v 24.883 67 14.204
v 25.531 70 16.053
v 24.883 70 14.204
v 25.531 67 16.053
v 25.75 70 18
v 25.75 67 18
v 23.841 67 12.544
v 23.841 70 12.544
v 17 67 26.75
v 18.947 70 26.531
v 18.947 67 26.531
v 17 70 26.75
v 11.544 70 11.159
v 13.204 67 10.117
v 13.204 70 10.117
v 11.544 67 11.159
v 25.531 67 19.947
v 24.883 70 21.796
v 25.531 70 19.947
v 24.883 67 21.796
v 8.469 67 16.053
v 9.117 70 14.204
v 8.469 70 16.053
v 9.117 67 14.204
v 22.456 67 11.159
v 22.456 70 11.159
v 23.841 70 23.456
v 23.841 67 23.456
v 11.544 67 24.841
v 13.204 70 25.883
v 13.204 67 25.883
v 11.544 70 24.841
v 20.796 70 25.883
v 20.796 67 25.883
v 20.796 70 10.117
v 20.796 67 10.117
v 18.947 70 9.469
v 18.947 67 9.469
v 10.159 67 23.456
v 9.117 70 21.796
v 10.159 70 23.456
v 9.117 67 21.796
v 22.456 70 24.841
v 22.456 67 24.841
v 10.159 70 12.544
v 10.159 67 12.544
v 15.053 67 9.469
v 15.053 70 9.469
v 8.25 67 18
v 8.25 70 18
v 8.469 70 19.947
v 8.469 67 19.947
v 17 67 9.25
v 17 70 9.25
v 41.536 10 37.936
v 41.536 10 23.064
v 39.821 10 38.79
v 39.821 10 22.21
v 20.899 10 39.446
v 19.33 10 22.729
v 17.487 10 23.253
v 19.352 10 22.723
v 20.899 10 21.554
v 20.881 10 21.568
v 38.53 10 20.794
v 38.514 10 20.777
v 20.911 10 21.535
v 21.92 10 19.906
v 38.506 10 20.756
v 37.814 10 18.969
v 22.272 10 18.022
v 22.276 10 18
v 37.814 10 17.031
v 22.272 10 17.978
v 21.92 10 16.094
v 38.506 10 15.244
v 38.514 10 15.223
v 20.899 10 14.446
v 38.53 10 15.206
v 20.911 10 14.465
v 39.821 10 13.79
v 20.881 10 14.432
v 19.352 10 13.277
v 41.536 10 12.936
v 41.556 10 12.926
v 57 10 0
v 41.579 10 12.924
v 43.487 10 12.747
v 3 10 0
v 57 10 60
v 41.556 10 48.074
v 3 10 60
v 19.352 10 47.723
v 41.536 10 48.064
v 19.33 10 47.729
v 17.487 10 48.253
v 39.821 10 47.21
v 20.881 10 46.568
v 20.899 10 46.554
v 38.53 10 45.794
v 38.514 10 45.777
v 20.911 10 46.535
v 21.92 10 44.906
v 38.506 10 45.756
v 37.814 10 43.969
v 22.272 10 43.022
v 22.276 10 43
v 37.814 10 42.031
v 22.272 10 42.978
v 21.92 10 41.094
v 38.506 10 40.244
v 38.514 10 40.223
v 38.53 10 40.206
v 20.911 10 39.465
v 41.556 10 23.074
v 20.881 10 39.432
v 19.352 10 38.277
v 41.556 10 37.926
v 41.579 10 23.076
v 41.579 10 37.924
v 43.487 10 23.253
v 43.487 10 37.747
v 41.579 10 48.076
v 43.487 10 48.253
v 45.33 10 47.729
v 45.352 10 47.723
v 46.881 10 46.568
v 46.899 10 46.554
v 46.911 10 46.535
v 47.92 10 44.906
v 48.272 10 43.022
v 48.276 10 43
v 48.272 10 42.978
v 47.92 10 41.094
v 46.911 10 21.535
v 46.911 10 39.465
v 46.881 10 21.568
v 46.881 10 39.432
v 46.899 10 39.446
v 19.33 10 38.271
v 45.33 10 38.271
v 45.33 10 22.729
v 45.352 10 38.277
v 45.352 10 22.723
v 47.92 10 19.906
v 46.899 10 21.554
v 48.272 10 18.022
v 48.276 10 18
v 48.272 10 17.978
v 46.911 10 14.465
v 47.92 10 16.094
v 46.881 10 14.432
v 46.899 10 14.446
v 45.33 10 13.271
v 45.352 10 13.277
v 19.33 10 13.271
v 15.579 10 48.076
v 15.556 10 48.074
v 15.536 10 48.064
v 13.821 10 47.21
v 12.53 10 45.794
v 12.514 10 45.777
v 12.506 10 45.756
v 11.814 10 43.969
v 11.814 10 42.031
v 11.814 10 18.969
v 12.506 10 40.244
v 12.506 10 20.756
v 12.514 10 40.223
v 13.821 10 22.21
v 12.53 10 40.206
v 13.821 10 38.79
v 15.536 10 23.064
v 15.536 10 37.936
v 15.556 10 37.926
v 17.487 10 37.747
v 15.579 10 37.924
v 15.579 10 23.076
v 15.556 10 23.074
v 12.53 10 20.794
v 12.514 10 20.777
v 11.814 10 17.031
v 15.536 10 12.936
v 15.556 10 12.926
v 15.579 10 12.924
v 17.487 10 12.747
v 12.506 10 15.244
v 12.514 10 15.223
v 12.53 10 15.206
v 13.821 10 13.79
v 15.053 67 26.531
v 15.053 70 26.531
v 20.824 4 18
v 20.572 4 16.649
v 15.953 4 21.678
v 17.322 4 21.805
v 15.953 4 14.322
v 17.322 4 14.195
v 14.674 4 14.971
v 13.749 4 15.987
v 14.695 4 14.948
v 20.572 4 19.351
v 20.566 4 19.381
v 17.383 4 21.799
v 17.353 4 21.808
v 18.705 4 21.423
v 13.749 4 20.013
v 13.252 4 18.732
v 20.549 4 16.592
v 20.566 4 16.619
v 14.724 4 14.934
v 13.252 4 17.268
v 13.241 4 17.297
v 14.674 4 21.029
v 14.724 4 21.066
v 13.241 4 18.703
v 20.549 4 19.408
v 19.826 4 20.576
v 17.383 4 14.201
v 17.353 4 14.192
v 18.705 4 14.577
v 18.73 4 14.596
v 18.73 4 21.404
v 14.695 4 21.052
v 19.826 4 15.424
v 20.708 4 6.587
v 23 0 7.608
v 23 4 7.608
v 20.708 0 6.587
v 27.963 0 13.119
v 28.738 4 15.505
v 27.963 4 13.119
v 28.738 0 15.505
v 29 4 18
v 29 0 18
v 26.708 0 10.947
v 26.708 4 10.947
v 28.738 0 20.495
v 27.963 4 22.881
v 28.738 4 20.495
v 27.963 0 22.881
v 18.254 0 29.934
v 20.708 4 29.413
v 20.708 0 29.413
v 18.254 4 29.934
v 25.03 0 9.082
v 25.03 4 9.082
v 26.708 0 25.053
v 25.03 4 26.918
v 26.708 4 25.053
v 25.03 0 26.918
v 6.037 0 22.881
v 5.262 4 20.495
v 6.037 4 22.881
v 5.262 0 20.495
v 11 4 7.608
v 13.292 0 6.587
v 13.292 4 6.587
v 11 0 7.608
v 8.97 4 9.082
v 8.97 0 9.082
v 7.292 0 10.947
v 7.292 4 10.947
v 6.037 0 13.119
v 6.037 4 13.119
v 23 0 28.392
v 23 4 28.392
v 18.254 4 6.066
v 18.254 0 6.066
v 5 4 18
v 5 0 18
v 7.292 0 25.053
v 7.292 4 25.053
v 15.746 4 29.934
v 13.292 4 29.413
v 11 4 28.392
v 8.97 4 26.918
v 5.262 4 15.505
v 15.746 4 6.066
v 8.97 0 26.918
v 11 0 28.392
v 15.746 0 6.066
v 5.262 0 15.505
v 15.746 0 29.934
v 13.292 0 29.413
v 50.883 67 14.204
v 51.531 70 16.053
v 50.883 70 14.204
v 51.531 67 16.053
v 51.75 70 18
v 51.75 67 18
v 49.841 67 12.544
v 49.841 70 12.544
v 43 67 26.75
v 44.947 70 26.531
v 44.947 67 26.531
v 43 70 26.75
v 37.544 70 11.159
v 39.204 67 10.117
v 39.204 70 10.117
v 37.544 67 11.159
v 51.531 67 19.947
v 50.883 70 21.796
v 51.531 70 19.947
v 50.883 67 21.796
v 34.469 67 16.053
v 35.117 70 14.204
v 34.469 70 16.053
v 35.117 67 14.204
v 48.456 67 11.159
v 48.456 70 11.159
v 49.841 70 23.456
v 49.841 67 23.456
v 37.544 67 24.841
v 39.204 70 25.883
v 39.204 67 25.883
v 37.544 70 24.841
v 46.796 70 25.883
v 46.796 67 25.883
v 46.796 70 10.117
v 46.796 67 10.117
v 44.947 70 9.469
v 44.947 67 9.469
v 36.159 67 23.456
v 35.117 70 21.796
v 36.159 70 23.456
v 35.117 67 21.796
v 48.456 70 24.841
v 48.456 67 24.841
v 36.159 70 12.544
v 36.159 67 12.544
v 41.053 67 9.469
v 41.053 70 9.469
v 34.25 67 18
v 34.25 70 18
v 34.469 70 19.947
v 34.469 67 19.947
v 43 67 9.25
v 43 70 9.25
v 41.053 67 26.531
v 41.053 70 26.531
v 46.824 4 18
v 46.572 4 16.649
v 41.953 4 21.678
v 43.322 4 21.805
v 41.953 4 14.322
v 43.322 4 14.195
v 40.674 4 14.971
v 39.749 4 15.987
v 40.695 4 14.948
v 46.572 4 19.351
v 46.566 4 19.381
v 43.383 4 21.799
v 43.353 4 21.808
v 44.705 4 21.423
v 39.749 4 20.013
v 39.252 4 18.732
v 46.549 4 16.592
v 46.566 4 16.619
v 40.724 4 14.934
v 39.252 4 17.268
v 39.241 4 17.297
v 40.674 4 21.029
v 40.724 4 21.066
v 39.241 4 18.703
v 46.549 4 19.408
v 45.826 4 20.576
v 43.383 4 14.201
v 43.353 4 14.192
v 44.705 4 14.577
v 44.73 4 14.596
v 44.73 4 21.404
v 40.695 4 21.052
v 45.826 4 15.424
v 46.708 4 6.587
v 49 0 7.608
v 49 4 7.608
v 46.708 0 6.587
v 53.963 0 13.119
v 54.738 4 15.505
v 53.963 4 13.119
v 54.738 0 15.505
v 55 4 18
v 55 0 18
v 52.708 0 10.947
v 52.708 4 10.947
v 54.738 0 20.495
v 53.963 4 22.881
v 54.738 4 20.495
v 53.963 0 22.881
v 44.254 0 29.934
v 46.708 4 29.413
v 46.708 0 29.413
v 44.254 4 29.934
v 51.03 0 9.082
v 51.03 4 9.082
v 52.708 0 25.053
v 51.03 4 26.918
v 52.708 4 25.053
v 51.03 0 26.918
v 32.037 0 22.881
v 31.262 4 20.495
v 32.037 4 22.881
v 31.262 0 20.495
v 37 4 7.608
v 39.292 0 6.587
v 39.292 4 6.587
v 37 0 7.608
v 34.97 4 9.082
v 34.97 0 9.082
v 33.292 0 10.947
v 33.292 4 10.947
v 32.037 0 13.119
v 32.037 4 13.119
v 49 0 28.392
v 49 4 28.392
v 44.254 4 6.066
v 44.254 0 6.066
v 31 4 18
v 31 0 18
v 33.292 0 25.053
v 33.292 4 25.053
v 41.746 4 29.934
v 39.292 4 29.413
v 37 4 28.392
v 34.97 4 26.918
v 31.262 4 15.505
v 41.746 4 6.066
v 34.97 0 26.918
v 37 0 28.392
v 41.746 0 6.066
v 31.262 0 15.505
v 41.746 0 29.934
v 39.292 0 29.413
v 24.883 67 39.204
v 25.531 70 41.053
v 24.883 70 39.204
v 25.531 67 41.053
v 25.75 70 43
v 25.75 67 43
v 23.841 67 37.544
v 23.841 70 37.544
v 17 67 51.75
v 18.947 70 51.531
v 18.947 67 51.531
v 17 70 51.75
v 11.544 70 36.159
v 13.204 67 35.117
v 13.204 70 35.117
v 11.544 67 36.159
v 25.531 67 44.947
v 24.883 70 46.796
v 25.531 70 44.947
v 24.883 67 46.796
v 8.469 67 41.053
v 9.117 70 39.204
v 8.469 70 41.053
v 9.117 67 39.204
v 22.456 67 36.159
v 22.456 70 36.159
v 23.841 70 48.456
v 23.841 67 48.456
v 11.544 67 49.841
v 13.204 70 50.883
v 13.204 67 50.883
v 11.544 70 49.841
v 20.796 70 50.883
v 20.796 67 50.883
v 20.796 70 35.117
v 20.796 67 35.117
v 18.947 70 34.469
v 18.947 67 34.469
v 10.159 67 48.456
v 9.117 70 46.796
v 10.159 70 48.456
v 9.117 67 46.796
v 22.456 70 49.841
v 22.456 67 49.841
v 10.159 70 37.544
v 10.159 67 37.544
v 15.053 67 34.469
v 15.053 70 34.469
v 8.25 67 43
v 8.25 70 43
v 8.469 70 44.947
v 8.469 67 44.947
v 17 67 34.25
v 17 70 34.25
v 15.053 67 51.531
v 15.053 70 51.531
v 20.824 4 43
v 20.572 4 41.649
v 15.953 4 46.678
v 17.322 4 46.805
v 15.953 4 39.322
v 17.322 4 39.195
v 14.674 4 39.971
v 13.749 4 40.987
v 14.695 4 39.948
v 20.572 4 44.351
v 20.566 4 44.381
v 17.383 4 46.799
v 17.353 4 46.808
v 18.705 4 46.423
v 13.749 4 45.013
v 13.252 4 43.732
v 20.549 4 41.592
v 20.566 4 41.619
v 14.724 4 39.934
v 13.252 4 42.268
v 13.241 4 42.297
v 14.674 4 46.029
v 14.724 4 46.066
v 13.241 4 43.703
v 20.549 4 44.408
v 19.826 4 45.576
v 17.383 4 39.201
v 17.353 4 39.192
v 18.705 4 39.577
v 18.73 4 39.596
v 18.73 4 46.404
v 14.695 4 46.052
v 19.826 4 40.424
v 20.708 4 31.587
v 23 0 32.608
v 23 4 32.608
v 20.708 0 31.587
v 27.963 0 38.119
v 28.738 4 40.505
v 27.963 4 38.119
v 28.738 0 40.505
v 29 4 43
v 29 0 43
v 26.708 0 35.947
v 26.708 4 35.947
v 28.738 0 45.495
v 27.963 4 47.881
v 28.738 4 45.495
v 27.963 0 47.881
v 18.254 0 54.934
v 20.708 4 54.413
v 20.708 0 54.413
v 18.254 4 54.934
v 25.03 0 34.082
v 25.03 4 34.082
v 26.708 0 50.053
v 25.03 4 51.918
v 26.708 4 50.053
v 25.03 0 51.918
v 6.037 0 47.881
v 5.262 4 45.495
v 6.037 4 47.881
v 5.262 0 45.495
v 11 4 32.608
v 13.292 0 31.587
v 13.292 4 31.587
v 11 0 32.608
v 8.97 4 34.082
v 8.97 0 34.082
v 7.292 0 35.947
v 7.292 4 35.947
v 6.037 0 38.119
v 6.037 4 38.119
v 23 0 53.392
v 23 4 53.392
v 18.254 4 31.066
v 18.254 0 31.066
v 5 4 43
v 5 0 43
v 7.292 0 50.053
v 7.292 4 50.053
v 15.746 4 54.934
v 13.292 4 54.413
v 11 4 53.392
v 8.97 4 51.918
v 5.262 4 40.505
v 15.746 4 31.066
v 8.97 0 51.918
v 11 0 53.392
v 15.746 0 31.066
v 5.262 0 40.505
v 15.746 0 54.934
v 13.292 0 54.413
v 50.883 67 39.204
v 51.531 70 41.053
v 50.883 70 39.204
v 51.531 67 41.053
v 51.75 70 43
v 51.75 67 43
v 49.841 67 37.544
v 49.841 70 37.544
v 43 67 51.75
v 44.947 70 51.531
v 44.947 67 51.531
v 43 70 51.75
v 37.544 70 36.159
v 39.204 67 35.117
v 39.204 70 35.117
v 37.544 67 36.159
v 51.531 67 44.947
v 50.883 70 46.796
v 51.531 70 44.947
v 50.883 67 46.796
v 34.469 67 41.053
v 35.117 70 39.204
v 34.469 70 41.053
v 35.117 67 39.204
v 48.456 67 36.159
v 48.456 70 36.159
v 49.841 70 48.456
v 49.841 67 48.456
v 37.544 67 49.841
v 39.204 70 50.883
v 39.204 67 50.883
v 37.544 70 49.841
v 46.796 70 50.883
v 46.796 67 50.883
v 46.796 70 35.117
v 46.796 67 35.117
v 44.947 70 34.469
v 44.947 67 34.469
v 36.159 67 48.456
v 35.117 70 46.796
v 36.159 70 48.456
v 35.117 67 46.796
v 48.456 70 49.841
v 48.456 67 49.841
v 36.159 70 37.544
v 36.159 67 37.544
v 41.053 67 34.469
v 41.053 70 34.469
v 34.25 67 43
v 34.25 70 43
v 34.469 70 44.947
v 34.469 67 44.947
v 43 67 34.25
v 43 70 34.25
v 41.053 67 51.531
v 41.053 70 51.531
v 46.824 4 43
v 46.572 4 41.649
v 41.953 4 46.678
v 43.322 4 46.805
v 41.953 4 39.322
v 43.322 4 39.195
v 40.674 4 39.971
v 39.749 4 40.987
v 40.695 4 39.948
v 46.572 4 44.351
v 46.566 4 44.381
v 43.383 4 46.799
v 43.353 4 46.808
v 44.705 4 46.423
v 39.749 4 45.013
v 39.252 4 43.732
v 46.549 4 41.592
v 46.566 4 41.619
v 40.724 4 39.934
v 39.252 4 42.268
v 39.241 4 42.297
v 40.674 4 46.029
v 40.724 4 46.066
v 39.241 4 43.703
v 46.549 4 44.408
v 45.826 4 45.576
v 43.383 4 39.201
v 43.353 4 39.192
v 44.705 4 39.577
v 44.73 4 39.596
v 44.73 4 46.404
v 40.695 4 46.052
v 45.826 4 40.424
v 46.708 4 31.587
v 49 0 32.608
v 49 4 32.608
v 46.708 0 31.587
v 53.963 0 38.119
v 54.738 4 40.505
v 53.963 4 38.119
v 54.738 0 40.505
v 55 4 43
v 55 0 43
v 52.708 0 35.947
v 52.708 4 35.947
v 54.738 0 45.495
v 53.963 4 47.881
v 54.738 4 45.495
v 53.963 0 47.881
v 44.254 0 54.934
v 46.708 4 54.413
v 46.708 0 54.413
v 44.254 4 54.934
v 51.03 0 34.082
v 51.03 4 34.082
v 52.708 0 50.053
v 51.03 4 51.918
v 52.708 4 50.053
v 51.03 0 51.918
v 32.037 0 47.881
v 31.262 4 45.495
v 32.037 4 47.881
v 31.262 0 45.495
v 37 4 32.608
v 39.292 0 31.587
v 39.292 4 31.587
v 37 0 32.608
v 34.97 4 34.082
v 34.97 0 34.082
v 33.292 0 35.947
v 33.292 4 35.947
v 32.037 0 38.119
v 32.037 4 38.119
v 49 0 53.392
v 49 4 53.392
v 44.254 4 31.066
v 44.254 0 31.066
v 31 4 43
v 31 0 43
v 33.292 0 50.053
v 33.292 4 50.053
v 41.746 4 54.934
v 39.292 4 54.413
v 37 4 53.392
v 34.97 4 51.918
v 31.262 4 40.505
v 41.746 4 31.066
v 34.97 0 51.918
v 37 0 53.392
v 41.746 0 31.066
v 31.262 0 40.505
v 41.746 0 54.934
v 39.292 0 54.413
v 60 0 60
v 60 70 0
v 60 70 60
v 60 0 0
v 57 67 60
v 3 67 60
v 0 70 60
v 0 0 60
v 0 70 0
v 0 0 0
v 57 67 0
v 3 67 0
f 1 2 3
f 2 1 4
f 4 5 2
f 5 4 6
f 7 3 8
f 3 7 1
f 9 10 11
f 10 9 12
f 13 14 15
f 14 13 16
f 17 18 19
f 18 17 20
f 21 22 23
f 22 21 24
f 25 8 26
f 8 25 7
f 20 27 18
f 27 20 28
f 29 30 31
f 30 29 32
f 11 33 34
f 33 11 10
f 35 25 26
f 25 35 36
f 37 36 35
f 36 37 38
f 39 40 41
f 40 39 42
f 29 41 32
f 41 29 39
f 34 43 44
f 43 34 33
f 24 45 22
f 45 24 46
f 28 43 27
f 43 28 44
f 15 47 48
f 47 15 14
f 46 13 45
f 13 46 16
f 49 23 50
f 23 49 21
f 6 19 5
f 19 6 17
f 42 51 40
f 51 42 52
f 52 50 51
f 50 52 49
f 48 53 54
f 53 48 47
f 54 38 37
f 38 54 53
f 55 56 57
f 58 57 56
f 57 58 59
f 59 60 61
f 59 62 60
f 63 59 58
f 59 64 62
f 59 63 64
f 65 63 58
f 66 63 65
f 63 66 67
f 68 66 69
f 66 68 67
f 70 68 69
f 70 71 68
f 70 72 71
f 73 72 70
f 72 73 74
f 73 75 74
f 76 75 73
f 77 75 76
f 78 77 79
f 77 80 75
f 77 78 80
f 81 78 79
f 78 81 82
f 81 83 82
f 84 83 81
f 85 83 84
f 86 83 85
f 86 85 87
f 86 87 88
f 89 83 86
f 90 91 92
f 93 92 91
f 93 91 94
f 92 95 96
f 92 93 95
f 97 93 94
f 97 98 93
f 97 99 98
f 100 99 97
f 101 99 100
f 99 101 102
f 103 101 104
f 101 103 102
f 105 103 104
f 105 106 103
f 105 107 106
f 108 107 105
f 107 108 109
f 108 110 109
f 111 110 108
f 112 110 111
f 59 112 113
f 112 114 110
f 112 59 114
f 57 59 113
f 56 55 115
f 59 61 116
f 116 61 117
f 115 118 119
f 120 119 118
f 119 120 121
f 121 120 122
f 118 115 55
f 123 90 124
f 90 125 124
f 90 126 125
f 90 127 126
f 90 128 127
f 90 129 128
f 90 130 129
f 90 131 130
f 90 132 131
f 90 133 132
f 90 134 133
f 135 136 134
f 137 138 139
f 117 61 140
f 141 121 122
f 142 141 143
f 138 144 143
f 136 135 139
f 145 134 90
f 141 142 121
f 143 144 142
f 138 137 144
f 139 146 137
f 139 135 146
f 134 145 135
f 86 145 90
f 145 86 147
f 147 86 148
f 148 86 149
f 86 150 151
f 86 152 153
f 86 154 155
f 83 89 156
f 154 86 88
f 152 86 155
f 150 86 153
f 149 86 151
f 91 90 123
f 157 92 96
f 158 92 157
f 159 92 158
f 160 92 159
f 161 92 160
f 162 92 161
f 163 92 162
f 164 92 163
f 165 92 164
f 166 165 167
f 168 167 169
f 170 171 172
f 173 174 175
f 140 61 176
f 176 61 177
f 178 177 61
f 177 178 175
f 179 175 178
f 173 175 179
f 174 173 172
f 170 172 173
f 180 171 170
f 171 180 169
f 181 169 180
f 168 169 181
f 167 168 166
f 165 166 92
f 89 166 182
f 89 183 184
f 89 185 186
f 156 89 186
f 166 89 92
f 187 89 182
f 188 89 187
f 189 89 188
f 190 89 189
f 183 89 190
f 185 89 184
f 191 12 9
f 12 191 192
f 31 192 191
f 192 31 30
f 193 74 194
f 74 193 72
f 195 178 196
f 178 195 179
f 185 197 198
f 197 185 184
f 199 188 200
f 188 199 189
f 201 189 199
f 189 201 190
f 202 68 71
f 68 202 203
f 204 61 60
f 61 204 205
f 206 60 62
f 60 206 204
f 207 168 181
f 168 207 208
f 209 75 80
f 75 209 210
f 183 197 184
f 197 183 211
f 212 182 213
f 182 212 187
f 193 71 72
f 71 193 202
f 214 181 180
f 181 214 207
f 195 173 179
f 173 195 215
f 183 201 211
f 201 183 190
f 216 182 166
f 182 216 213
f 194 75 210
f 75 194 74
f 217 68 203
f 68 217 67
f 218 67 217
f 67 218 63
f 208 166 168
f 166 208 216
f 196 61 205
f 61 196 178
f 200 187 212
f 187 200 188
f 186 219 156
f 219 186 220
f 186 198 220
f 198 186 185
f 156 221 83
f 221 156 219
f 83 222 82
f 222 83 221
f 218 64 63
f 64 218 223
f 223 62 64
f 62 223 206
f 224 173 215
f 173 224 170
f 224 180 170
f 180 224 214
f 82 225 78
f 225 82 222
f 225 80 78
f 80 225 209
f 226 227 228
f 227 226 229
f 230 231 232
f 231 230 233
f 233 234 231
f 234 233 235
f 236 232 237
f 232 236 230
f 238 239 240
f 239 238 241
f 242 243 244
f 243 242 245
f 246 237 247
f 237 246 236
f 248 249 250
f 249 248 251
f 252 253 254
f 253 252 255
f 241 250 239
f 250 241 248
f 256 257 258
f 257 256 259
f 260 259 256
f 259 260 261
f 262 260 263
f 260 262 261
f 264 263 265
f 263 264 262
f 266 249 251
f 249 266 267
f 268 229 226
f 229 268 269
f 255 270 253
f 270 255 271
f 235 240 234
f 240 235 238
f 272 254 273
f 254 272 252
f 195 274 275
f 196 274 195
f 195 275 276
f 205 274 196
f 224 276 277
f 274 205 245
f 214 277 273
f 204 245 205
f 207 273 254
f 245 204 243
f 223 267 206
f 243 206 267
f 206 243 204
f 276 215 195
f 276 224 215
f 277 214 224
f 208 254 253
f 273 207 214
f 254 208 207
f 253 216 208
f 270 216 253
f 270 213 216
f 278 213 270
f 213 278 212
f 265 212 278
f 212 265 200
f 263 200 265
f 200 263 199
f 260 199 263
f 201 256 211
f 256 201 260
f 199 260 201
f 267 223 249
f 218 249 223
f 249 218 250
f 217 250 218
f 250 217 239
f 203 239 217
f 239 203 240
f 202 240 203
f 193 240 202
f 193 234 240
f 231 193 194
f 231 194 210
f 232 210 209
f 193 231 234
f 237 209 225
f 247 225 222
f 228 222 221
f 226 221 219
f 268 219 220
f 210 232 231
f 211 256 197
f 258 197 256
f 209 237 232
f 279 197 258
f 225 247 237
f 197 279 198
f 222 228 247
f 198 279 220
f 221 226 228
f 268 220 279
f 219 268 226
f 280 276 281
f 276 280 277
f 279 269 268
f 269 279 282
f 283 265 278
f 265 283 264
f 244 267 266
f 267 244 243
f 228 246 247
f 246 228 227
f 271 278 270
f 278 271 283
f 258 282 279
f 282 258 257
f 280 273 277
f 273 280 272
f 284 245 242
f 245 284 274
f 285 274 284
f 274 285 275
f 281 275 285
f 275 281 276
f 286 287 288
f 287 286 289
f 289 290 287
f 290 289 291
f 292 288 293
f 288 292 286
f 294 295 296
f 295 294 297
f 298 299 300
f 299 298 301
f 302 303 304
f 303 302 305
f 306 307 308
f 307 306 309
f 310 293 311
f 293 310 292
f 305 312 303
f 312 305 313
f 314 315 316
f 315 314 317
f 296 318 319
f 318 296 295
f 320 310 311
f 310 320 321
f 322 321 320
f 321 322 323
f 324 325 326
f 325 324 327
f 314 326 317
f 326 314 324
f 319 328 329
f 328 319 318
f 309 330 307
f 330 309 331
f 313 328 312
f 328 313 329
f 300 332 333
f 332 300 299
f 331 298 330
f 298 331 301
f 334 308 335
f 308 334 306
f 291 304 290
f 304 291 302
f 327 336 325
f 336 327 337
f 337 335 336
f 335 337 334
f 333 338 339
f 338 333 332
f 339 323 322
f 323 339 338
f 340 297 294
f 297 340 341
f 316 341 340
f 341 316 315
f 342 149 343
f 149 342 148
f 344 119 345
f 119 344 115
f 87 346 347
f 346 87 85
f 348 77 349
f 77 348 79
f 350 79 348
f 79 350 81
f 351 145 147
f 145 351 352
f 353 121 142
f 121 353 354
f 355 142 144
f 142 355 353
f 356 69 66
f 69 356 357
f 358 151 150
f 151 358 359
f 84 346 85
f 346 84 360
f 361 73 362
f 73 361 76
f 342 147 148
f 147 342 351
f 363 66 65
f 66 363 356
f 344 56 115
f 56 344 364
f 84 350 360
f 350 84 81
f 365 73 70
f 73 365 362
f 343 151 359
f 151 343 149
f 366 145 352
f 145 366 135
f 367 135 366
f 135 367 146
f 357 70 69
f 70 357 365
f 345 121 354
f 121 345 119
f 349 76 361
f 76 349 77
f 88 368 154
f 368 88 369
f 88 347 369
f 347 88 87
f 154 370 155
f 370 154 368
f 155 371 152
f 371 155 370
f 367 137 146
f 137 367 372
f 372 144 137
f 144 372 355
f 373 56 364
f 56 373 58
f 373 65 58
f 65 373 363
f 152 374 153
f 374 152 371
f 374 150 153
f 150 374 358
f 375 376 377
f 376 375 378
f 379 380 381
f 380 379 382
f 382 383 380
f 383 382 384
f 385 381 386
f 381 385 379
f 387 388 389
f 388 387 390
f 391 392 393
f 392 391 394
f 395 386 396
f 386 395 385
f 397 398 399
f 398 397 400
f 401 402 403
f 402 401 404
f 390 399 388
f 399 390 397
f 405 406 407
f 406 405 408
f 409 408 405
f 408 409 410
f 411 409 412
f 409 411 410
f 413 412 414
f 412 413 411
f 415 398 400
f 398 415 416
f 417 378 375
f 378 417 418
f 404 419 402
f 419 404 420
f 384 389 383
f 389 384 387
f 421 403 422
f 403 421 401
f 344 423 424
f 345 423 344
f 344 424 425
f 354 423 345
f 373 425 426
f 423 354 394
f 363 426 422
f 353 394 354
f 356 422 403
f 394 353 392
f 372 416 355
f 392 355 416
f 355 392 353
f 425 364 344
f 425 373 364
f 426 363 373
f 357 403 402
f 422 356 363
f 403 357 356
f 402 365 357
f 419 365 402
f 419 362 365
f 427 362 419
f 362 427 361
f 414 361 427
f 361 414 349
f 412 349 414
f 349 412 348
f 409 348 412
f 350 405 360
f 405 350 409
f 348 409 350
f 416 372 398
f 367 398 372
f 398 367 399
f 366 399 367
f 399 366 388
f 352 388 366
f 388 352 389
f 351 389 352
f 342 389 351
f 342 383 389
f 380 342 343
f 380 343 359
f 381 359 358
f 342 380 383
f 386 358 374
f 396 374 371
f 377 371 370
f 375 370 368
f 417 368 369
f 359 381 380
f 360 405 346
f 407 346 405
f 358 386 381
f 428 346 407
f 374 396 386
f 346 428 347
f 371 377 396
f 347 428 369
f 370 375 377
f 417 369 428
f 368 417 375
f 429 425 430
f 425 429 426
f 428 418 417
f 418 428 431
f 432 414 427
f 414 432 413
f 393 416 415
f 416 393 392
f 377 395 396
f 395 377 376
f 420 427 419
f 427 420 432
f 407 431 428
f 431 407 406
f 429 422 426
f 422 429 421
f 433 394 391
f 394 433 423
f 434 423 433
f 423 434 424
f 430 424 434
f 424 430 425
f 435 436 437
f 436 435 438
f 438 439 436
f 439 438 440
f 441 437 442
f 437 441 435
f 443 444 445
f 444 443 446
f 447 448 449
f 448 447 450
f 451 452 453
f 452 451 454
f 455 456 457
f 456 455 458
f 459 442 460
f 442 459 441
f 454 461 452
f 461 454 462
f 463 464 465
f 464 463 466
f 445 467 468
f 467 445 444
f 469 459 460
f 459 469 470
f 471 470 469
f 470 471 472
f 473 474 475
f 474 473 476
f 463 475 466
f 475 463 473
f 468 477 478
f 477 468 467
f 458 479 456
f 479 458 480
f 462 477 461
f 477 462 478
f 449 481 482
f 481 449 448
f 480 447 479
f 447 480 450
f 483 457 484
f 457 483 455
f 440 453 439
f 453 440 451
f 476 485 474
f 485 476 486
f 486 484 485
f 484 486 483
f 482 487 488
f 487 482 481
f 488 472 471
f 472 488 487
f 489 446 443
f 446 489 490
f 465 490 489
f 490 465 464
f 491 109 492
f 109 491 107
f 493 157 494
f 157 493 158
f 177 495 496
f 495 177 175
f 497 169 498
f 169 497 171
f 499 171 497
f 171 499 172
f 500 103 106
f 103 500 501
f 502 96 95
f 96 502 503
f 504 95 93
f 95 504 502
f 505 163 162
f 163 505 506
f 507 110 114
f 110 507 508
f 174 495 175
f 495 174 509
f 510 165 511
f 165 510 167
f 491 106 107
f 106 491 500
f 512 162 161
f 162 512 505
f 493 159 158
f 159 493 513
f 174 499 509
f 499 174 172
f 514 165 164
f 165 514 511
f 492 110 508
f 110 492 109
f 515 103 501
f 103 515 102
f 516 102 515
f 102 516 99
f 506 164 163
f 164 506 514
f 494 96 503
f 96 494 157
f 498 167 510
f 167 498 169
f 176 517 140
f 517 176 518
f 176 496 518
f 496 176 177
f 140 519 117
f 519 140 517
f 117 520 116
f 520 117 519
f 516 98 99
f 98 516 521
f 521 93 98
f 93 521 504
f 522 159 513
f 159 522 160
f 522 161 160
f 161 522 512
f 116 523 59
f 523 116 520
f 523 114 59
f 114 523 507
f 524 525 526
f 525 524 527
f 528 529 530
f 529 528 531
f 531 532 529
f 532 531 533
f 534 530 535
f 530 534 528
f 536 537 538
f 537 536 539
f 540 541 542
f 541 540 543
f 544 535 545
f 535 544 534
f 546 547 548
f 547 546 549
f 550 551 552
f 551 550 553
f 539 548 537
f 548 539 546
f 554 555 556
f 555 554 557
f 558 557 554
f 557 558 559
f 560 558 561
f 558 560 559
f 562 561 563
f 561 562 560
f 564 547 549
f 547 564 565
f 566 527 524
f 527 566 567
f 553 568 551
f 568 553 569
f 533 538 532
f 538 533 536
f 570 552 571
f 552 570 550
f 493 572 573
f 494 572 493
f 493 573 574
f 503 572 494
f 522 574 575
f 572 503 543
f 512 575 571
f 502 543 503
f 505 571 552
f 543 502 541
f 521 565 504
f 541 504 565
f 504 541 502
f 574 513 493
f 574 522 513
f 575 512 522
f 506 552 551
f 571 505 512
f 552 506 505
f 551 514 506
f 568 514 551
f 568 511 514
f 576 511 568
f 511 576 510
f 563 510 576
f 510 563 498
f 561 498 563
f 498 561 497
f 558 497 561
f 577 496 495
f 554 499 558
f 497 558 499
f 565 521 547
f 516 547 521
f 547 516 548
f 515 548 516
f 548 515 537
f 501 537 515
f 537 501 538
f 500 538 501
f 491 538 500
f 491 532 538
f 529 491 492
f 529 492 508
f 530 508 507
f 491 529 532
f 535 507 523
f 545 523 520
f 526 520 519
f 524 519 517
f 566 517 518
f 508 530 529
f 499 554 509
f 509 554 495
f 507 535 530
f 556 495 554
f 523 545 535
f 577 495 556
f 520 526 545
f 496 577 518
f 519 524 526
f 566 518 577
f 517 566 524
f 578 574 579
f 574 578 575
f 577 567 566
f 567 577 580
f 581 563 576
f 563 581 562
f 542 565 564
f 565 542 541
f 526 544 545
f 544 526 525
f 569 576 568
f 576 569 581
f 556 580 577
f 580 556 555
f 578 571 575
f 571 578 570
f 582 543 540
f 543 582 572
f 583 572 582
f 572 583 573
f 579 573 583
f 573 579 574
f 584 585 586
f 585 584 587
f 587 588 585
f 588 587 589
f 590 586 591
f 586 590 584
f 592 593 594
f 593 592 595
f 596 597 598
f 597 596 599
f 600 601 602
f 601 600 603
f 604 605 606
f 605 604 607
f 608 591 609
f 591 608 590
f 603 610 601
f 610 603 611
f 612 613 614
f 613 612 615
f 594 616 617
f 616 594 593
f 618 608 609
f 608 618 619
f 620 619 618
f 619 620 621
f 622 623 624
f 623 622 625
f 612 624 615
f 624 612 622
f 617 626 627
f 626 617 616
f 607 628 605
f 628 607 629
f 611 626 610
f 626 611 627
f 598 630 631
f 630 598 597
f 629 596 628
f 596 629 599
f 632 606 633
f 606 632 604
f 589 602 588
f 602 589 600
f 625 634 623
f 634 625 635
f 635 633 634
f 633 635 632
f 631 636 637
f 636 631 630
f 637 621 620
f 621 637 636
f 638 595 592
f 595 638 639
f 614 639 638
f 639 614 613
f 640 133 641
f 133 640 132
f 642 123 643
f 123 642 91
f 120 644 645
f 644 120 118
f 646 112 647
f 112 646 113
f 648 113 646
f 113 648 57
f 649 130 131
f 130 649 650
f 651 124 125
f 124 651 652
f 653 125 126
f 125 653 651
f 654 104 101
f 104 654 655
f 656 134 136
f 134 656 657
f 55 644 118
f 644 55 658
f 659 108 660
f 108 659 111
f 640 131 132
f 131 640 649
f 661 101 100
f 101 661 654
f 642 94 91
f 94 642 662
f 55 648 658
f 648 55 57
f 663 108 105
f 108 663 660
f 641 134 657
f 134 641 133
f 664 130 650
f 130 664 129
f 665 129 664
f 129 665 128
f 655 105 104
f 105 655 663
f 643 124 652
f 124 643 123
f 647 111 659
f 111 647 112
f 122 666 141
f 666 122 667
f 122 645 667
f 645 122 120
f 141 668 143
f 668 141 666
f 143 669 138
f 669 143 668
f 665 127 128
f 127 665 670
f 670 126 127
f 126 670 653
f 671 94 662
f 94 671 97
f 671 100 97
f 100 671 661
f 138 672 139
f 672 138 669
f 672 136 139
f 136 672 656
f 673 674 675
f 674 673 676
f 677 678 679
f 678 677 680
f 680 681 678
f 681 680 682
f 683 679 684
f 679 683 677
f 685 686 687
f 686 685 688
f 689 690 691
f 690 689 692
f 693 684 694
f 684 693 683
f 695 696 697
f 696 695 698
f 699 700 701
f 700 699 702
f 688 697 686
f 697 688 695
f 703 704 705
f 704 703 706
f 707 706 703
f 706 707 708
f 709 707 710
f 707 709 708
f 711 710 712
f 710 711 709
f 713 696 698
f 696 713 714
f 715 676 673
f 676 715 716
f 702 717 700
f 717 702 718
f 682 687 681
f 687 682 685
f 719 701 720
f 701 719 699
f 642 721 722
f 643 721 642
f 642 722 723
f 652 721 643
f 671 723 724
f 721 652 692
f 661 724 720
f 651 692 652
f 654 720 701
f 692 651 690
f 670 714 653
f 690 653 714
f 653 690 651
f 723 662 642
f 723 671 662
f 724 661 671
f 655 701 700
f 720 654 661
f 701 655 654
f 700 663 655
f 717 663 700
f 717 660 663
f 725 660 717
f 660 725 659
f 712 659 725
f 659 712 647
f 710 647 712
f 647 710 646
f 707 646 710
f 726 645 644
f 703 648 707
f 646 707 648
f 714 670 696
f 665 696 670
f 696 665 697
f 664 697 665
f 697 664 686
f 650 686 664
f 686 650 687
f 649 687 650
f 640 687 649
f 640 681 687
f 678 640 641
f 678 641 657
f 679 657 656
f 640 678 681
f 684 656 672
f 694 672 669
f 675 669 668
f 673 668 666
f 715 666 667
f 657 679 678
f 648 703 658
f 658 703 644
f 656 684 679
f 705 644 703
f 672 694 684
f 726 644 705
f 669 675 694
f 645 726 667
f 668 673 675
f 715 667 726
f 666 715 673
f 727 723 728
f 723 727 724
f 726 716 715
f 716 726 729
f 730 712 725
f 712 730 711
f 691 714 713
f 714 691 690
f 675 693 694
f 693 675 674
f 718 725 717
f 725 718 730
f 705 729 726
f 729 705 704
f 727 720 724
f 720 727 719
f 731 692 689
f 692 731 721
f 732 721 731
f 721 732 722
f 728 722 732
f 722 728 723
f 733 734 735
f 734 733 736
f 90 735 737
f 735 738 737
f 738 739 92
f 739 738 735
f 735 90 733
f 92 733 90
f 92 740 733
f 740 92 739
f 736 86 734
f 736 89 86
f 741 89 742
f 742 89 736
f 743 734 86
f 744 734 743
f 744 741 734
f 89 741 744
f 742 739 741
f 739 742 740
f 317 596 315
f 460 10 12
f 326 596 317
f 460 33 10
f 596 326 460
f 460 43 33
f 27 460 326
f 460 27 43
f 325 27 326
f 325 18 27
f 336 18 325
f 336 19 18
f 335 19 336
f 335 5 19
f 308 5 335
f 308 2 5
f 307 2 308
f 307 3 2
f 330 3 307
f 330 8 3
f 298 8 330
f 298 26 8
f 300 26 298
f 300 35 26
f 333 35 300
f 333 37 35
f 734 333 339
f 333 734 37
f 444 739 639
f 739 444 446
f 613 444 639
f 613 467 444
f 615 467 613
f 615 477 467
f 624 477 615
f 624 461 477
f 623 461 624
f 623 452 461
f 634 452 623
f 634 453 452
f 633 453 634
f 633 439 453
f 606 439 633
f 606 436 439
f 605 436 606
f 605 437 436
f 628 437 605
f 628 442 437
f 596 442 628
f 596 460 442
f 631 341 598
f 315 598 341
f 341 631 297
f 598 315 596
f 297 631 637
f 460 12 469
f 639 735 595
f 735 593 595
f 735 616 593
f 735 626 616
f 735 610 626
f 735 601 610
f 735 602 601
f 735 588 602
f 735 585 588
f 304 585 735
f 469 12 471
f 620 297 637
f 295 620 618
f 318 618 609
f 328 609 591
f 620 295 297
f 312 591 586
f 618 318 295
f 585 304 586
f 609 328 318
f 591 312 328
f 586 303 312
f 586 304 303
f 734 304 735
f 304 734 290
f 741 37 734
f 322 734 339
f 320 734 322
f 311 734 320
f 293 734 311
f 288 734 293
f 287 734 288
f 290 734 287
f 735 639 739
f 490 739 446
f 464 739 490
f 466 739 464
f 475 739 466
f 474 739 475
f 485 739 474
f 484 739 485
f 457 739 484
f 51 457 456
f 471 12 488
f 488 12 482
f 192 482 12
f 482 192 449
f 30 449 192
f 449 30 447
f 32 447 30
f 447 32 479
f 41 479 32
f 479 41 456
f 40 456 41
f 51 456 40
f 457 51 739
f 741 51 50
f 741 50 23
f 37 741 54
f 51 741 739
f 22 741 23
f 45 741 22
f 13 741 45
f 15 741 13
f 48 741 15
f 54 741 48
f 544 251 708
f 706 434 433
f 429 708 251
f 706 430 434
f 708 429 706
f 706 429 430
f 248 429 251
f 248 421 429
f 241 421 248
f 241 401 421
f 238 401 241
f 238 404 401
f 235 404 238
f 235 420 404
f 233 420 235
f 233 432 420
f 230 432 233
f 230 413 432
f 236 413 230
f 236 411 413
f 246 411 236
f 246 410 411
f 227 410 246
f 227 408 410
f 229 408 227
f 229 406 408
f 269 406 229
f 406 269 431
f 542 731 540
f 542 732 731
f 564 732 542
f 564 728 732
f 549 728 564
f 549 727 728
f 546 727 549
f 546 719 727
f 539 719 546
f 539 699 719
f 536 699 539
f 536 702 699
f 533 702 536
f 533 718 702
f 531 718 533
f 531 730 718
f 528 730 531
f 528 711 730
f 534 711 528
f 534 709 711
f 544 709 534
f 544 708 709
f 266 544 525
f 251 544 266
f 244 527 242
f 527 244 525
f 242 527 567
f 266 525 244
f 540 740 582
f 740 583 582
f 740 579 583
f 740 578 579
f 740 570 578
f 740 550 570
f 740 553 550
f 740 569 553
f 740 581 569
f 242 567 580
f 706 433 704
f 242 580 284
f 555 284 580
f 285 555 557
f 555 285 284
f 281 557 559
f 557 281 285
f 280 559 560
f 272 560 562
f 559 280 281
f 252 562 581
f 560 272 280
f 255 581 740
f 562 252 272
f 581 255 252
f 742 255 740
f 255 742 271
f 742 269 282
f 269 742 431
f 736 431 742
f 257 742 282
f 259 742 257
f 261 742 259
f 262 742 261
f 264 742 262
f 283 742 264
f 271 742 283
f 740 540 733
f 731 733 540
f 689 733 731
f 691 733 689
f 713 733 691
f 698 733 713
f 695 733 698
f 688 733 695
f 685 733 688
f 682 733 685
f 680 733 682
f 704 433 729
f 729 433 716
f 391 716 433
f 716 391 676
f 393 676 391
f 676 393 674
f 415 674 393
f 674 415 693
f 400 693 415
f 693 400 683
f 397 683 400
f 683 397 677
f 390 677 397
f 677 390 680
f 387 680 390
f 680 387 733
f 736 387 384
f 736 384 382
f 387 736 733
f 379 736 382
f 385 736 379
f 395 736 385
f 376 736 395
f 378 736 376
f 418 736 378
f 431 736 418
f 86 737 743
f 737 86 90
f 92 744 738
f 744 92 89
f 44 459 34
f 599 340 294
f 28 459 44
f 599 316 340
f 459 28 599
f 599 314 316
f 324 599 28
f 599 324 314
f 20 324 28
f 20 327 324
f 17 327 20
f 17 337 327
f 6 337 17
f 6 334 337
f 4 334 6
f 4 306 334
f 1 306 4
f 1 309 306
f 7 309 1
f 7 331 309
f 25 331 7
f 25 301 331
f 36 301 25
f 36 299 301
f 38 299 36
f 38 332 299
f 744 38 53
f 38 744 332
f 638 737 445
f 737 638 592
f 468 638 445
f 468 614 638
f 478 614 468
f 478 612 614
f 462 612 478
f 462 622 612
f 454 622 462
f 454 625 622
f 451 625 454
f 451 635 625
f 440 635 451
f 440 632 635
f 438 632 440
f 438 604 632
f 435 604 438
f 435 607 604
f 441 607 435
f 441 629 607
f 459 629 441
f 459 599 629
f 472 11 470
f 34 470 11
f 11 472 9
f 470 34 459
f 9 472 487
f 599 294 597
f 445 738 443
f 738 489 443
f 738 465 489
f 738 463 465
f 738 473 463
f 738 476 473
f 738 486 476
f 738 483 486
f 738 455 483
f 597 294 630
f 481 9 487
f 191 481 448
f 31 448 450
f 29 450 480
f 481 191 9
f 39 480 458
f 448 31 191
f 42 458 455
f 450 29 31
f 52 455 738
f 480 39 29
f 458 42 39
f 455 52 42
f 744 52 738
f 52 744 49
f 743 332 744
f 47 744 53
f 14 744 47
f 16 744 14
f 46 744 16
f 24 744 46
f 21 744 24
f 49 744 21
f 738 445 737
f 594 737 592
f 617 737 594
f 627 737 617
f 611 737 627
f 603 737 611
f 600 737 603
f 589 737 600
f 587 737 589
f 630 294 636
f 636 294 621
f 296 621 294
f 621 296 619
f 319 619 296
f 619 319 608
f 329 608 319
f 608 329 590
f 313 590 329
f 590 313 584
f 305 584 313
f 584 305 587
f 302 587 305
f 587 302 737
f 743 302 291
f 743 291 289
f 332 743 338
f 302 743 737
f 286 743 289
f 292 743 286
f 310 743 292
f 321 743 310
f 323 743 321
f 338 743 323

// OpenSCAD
// Vial dimensions from:
// https://www.viaglobalhealth.com/wp-content/uploads/corning-docs/t_centrifuge_tube_insert_DL.pdf

vial_radius = 17.5/2;
vial_cap_radius = 24/2;
bottom_hole_radius = 3.8;

stand_height = 70;
base_height = 10;

vial_cap_clearance = 2;

wall_size = 3;


module tube_cutouts() {
    translate([0,base_height,0]) rotate([-90,0,0]) cylinder(h=stand_height, r=vial_radius);
    #translate([0,3.9,0]) rotate([-90,0,0]) cylinder(h=base_height+0.1-3.9, r1=bottom_hole_radius,r2=bottom_hole_radius+1.5);
    translate([0,-0.1,0]) rotate([-90,0,0]) cylinder(h=4.1, r=vial_cap_radius);
}


stand_width = vial_cap_radius*4+(wall_size*2)+6;

difference() {
    cube([stand_width,stand_height,stand_width]);
    translate([wall_size,base_height,-0.1]) cube([stand_width-(wall_size*2),stand_height-(base_height)-wall_size,stand_width+1]);
    translate([wall_size+2+vial_cap_radius,0,4+2+vial_cap_radius]) tube_cutouts();
    translate([wall_size+4+vial_cap_radius*3,0,4+2+vial_cap_radius]) tube_cutouts();
    translate([wall_size+2+vial_cap_radius,0,wall_size+4+vial_cap_radius*3]) tube_cutouts();
    translate([wall_size+4+vial_cap_radius*3,0,wall_size+4+vial_cap_radius*3]) tube_cutouts();
}
